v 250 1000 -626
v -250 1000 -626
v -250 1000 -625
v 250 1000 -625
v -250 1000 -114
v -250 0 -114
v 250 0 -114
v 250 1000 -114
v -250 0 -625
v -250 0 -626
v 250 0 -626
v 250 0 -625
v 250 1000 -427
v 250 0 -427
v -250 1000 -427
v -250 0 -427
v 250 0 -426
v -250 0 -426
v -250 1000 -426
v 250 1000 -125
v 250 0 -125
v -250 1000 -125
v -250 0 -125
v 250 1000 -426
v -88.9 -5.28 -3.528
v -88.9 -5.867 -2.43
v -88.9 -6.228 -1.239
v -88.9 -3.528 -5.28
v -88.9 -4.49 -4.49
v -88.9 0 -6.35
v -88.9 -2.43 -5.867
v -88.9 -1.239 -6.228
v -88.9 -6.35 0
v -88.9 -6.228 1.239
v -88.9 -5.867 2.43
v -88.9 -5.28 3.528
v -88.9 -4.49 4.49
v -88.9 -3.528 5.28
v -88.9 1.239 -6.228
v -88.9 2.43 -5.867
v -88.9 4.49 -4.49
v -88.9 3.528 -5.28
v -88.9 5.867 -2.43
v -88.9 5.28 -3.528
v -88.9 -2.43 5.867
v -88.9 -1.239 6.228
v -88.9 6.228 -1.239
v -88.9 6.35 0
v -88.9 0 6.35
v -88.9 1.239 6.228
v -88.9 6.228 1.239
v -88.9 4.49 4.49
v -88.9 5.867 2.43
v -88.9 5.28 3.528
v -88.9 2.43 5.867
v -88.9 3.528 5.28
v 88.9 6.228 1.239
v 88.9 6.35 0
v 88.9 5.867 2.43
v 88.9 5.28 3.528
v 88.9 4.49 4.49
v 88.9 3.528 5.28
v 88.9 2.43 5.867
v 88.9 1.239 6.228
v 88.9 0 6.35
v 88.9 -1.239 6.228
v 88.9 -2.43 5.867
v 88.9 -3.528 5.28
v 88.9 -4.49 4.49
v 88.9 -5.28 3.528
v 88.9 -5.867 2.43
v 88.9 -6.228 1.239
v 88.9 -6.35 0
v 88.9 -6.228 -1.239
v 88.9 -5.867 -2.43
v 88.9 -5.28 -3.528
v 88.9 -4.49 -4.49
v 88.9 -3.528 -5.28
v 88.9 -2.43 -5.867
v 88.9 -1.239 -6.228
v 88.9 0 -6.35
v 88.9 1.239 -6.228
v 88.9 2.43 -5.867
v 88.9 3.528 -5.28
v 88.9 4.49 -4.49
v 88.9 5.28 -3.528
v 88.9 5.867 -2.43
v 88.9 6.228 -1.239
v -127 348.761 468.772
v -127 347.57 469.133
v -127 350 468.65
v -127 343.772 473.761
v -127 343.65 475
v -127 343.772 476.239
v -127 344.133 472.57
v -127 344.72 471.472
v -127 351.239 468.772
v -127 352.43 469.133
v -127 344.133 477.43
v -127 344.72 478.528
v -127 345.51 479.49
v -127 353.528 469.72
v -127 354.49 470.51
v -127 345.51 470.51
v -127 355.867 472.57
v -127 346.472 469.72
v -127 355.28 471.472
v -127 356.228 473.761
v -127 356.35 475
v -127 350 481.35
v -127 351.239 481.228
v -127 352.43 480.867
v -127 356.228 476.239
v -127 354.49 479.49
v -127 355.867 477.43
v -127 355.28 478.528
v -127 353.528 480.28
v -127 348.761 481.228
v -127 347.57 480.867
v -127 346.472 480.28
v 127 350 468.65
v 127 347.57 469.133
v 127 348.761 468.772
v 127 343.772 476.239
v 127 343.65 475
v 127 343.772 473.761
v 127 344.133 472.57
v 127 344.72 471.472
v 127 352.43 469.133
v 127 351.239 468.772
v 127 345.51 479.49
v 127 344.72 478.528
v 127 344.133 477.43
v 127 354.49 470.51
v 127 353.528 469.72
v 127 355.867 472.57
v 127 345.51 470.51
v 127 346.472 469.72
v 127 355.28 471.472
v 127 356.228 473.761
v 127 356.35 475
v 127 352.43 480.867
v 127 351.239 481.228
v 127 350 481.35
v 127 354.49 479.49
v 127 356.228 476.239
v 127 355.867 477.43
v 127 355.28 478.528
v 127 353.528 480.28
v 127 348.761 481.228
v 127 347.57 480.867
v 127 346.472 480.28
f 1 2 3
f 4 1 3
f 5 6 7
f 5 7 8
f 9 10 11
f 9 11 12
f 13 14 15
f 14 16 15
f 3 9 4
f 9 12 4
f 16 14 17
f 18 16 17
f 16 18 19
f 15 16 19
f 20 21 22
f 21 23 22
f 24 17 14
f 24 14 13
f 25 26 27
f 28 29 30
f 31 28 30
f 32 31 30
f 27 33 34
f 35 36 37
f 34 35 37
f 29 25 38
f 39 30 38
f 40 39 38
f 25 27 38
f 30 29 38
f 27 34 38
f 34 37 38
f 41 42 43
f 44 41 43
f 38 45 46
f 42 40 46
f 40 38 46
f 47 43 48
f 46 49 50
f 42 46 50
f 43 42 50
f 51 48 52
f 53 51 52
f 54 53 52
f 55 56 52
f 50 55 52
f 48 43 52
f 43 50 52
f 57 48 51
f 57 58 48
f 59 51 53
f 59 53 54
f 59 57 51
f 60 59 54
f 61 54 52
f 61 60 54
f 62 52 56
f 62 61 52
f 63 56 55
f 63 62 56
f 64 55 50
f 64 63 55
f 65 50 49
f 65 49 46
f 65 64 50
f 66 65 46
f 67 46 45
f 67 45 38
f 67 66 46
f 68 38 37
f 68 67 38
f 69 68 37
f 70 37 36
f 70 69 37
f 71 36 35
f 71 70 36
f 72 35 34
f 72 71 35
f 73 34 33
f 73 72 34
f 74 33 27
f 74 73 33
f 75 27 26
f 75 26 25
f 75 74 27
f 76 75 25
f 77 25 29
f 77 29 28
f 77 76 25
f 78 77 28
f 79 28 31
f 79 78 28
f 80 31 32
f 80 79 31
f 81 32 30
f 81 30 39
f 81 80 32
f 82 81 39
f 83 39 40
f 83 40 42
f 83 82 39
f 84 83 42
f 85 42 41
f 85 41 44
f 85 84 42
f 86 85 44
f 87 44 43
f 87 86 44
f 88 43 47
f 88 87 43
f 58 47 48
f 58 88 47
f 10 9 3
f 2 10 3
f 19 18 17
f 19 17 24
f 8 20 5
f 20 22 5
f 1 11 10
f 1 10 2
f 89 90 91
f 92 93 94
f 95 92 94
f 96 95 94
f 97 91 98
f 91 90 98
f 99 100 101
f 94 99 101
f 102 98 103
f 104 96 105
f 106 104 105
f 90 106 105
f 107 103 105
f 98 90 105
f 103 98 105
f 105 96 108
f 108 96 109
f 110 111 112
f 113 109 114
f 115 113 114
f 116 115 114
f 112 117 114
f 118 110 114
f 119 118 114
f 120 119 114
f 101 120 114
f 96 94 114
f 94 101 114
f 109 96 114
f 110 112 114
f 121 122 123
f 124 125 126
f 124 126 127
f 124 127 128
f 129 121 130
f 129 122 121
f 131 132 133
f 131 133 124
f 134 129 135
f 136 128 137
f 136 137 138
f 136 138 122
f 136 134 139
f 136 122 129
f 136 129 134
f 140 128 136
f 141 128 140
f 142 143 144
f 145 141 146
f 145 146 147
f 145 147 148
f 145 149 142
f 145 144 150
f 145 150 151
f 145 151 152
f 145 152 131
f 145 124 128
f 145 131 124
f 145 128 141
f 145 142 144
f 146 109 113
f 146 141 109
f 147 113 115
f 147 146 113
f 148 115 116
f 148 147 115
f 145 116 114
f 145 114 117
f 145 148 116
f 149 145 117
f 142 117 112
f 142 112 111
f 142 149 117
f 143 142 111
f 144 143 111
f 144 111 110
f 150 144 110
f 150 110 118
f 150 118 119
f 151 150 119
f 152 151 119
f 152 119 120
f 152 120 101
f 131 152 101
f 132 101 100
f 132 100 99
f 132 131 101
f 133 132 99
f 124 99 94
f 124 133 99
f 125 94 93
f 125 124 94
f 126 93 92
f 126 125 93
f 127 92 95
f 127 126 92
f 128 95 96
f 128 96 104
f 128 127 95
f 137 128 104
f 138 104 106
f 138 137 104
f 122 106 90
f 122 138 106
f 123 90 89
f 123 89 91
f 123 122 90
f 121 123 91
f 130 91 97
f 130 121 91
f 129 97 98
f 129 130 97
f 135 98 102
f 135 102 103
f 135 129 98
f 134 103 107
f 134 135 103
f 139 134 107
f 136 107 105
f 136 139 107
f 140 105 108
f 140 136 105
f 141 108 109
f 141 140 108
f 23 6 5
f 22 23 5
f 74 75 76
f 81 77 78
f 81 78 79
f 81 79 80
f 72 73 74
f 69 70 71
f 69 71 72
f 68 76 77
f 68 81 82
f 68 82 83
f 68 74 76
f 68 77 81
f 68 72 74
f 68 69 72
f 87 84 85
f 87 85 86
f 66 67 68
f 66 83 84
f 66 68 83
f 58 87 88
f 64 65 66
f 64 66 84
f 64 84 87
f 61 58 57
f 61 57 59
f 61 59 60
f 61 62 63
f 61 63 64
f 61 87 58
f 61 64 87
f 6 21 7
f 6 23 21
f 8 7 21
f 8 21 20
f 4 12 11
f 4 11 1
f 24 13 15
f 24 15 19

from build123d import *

# Parameters (mm, degrees)
F0_R     = 6.35
F1_DEPTH = 88.9
F2_W     = 1000
F2_H     = 11
F2_H_2   = 1
F3_DEPTH = 250
F4_R     = 6.35
F5_DEPTH = 127


with BuildPart() as f1:
    # F0 (on Right) → F1 (new body, symmetric)
    with BuildSketch(Plane.YZ):
        Circle(F0_R)
    extrude(amount=F1_DEPTH, both=True)


with BuildPart() as f3:
    # F2 (on Right) → F3 (new body, symmetric)
    with BuildSketch(Plane.YZ):
        with Locations((500, -119.5)):
            Rectangle(F2_W, F2_H)
        with Locations((500, -426.5)):
            Rectangle(F2_W, F2_H_2)
        with Locations((500, -625.5)):
            Rectangle(F2_W, F2_H_2)
    extrude(amount=F3_DEPTH, both=True)


with BuildPart() as f5:
    # F4 (on Right) → F5 (new body, symmetric)
    with BuildSketch(Plane.YZ):
        with Locations((350, 475)):
            Circle(F4_R)
    extrude(amount=F5_DEPTH, both=True)


solid = Compound([f1.part, f3.part, f5.part])
